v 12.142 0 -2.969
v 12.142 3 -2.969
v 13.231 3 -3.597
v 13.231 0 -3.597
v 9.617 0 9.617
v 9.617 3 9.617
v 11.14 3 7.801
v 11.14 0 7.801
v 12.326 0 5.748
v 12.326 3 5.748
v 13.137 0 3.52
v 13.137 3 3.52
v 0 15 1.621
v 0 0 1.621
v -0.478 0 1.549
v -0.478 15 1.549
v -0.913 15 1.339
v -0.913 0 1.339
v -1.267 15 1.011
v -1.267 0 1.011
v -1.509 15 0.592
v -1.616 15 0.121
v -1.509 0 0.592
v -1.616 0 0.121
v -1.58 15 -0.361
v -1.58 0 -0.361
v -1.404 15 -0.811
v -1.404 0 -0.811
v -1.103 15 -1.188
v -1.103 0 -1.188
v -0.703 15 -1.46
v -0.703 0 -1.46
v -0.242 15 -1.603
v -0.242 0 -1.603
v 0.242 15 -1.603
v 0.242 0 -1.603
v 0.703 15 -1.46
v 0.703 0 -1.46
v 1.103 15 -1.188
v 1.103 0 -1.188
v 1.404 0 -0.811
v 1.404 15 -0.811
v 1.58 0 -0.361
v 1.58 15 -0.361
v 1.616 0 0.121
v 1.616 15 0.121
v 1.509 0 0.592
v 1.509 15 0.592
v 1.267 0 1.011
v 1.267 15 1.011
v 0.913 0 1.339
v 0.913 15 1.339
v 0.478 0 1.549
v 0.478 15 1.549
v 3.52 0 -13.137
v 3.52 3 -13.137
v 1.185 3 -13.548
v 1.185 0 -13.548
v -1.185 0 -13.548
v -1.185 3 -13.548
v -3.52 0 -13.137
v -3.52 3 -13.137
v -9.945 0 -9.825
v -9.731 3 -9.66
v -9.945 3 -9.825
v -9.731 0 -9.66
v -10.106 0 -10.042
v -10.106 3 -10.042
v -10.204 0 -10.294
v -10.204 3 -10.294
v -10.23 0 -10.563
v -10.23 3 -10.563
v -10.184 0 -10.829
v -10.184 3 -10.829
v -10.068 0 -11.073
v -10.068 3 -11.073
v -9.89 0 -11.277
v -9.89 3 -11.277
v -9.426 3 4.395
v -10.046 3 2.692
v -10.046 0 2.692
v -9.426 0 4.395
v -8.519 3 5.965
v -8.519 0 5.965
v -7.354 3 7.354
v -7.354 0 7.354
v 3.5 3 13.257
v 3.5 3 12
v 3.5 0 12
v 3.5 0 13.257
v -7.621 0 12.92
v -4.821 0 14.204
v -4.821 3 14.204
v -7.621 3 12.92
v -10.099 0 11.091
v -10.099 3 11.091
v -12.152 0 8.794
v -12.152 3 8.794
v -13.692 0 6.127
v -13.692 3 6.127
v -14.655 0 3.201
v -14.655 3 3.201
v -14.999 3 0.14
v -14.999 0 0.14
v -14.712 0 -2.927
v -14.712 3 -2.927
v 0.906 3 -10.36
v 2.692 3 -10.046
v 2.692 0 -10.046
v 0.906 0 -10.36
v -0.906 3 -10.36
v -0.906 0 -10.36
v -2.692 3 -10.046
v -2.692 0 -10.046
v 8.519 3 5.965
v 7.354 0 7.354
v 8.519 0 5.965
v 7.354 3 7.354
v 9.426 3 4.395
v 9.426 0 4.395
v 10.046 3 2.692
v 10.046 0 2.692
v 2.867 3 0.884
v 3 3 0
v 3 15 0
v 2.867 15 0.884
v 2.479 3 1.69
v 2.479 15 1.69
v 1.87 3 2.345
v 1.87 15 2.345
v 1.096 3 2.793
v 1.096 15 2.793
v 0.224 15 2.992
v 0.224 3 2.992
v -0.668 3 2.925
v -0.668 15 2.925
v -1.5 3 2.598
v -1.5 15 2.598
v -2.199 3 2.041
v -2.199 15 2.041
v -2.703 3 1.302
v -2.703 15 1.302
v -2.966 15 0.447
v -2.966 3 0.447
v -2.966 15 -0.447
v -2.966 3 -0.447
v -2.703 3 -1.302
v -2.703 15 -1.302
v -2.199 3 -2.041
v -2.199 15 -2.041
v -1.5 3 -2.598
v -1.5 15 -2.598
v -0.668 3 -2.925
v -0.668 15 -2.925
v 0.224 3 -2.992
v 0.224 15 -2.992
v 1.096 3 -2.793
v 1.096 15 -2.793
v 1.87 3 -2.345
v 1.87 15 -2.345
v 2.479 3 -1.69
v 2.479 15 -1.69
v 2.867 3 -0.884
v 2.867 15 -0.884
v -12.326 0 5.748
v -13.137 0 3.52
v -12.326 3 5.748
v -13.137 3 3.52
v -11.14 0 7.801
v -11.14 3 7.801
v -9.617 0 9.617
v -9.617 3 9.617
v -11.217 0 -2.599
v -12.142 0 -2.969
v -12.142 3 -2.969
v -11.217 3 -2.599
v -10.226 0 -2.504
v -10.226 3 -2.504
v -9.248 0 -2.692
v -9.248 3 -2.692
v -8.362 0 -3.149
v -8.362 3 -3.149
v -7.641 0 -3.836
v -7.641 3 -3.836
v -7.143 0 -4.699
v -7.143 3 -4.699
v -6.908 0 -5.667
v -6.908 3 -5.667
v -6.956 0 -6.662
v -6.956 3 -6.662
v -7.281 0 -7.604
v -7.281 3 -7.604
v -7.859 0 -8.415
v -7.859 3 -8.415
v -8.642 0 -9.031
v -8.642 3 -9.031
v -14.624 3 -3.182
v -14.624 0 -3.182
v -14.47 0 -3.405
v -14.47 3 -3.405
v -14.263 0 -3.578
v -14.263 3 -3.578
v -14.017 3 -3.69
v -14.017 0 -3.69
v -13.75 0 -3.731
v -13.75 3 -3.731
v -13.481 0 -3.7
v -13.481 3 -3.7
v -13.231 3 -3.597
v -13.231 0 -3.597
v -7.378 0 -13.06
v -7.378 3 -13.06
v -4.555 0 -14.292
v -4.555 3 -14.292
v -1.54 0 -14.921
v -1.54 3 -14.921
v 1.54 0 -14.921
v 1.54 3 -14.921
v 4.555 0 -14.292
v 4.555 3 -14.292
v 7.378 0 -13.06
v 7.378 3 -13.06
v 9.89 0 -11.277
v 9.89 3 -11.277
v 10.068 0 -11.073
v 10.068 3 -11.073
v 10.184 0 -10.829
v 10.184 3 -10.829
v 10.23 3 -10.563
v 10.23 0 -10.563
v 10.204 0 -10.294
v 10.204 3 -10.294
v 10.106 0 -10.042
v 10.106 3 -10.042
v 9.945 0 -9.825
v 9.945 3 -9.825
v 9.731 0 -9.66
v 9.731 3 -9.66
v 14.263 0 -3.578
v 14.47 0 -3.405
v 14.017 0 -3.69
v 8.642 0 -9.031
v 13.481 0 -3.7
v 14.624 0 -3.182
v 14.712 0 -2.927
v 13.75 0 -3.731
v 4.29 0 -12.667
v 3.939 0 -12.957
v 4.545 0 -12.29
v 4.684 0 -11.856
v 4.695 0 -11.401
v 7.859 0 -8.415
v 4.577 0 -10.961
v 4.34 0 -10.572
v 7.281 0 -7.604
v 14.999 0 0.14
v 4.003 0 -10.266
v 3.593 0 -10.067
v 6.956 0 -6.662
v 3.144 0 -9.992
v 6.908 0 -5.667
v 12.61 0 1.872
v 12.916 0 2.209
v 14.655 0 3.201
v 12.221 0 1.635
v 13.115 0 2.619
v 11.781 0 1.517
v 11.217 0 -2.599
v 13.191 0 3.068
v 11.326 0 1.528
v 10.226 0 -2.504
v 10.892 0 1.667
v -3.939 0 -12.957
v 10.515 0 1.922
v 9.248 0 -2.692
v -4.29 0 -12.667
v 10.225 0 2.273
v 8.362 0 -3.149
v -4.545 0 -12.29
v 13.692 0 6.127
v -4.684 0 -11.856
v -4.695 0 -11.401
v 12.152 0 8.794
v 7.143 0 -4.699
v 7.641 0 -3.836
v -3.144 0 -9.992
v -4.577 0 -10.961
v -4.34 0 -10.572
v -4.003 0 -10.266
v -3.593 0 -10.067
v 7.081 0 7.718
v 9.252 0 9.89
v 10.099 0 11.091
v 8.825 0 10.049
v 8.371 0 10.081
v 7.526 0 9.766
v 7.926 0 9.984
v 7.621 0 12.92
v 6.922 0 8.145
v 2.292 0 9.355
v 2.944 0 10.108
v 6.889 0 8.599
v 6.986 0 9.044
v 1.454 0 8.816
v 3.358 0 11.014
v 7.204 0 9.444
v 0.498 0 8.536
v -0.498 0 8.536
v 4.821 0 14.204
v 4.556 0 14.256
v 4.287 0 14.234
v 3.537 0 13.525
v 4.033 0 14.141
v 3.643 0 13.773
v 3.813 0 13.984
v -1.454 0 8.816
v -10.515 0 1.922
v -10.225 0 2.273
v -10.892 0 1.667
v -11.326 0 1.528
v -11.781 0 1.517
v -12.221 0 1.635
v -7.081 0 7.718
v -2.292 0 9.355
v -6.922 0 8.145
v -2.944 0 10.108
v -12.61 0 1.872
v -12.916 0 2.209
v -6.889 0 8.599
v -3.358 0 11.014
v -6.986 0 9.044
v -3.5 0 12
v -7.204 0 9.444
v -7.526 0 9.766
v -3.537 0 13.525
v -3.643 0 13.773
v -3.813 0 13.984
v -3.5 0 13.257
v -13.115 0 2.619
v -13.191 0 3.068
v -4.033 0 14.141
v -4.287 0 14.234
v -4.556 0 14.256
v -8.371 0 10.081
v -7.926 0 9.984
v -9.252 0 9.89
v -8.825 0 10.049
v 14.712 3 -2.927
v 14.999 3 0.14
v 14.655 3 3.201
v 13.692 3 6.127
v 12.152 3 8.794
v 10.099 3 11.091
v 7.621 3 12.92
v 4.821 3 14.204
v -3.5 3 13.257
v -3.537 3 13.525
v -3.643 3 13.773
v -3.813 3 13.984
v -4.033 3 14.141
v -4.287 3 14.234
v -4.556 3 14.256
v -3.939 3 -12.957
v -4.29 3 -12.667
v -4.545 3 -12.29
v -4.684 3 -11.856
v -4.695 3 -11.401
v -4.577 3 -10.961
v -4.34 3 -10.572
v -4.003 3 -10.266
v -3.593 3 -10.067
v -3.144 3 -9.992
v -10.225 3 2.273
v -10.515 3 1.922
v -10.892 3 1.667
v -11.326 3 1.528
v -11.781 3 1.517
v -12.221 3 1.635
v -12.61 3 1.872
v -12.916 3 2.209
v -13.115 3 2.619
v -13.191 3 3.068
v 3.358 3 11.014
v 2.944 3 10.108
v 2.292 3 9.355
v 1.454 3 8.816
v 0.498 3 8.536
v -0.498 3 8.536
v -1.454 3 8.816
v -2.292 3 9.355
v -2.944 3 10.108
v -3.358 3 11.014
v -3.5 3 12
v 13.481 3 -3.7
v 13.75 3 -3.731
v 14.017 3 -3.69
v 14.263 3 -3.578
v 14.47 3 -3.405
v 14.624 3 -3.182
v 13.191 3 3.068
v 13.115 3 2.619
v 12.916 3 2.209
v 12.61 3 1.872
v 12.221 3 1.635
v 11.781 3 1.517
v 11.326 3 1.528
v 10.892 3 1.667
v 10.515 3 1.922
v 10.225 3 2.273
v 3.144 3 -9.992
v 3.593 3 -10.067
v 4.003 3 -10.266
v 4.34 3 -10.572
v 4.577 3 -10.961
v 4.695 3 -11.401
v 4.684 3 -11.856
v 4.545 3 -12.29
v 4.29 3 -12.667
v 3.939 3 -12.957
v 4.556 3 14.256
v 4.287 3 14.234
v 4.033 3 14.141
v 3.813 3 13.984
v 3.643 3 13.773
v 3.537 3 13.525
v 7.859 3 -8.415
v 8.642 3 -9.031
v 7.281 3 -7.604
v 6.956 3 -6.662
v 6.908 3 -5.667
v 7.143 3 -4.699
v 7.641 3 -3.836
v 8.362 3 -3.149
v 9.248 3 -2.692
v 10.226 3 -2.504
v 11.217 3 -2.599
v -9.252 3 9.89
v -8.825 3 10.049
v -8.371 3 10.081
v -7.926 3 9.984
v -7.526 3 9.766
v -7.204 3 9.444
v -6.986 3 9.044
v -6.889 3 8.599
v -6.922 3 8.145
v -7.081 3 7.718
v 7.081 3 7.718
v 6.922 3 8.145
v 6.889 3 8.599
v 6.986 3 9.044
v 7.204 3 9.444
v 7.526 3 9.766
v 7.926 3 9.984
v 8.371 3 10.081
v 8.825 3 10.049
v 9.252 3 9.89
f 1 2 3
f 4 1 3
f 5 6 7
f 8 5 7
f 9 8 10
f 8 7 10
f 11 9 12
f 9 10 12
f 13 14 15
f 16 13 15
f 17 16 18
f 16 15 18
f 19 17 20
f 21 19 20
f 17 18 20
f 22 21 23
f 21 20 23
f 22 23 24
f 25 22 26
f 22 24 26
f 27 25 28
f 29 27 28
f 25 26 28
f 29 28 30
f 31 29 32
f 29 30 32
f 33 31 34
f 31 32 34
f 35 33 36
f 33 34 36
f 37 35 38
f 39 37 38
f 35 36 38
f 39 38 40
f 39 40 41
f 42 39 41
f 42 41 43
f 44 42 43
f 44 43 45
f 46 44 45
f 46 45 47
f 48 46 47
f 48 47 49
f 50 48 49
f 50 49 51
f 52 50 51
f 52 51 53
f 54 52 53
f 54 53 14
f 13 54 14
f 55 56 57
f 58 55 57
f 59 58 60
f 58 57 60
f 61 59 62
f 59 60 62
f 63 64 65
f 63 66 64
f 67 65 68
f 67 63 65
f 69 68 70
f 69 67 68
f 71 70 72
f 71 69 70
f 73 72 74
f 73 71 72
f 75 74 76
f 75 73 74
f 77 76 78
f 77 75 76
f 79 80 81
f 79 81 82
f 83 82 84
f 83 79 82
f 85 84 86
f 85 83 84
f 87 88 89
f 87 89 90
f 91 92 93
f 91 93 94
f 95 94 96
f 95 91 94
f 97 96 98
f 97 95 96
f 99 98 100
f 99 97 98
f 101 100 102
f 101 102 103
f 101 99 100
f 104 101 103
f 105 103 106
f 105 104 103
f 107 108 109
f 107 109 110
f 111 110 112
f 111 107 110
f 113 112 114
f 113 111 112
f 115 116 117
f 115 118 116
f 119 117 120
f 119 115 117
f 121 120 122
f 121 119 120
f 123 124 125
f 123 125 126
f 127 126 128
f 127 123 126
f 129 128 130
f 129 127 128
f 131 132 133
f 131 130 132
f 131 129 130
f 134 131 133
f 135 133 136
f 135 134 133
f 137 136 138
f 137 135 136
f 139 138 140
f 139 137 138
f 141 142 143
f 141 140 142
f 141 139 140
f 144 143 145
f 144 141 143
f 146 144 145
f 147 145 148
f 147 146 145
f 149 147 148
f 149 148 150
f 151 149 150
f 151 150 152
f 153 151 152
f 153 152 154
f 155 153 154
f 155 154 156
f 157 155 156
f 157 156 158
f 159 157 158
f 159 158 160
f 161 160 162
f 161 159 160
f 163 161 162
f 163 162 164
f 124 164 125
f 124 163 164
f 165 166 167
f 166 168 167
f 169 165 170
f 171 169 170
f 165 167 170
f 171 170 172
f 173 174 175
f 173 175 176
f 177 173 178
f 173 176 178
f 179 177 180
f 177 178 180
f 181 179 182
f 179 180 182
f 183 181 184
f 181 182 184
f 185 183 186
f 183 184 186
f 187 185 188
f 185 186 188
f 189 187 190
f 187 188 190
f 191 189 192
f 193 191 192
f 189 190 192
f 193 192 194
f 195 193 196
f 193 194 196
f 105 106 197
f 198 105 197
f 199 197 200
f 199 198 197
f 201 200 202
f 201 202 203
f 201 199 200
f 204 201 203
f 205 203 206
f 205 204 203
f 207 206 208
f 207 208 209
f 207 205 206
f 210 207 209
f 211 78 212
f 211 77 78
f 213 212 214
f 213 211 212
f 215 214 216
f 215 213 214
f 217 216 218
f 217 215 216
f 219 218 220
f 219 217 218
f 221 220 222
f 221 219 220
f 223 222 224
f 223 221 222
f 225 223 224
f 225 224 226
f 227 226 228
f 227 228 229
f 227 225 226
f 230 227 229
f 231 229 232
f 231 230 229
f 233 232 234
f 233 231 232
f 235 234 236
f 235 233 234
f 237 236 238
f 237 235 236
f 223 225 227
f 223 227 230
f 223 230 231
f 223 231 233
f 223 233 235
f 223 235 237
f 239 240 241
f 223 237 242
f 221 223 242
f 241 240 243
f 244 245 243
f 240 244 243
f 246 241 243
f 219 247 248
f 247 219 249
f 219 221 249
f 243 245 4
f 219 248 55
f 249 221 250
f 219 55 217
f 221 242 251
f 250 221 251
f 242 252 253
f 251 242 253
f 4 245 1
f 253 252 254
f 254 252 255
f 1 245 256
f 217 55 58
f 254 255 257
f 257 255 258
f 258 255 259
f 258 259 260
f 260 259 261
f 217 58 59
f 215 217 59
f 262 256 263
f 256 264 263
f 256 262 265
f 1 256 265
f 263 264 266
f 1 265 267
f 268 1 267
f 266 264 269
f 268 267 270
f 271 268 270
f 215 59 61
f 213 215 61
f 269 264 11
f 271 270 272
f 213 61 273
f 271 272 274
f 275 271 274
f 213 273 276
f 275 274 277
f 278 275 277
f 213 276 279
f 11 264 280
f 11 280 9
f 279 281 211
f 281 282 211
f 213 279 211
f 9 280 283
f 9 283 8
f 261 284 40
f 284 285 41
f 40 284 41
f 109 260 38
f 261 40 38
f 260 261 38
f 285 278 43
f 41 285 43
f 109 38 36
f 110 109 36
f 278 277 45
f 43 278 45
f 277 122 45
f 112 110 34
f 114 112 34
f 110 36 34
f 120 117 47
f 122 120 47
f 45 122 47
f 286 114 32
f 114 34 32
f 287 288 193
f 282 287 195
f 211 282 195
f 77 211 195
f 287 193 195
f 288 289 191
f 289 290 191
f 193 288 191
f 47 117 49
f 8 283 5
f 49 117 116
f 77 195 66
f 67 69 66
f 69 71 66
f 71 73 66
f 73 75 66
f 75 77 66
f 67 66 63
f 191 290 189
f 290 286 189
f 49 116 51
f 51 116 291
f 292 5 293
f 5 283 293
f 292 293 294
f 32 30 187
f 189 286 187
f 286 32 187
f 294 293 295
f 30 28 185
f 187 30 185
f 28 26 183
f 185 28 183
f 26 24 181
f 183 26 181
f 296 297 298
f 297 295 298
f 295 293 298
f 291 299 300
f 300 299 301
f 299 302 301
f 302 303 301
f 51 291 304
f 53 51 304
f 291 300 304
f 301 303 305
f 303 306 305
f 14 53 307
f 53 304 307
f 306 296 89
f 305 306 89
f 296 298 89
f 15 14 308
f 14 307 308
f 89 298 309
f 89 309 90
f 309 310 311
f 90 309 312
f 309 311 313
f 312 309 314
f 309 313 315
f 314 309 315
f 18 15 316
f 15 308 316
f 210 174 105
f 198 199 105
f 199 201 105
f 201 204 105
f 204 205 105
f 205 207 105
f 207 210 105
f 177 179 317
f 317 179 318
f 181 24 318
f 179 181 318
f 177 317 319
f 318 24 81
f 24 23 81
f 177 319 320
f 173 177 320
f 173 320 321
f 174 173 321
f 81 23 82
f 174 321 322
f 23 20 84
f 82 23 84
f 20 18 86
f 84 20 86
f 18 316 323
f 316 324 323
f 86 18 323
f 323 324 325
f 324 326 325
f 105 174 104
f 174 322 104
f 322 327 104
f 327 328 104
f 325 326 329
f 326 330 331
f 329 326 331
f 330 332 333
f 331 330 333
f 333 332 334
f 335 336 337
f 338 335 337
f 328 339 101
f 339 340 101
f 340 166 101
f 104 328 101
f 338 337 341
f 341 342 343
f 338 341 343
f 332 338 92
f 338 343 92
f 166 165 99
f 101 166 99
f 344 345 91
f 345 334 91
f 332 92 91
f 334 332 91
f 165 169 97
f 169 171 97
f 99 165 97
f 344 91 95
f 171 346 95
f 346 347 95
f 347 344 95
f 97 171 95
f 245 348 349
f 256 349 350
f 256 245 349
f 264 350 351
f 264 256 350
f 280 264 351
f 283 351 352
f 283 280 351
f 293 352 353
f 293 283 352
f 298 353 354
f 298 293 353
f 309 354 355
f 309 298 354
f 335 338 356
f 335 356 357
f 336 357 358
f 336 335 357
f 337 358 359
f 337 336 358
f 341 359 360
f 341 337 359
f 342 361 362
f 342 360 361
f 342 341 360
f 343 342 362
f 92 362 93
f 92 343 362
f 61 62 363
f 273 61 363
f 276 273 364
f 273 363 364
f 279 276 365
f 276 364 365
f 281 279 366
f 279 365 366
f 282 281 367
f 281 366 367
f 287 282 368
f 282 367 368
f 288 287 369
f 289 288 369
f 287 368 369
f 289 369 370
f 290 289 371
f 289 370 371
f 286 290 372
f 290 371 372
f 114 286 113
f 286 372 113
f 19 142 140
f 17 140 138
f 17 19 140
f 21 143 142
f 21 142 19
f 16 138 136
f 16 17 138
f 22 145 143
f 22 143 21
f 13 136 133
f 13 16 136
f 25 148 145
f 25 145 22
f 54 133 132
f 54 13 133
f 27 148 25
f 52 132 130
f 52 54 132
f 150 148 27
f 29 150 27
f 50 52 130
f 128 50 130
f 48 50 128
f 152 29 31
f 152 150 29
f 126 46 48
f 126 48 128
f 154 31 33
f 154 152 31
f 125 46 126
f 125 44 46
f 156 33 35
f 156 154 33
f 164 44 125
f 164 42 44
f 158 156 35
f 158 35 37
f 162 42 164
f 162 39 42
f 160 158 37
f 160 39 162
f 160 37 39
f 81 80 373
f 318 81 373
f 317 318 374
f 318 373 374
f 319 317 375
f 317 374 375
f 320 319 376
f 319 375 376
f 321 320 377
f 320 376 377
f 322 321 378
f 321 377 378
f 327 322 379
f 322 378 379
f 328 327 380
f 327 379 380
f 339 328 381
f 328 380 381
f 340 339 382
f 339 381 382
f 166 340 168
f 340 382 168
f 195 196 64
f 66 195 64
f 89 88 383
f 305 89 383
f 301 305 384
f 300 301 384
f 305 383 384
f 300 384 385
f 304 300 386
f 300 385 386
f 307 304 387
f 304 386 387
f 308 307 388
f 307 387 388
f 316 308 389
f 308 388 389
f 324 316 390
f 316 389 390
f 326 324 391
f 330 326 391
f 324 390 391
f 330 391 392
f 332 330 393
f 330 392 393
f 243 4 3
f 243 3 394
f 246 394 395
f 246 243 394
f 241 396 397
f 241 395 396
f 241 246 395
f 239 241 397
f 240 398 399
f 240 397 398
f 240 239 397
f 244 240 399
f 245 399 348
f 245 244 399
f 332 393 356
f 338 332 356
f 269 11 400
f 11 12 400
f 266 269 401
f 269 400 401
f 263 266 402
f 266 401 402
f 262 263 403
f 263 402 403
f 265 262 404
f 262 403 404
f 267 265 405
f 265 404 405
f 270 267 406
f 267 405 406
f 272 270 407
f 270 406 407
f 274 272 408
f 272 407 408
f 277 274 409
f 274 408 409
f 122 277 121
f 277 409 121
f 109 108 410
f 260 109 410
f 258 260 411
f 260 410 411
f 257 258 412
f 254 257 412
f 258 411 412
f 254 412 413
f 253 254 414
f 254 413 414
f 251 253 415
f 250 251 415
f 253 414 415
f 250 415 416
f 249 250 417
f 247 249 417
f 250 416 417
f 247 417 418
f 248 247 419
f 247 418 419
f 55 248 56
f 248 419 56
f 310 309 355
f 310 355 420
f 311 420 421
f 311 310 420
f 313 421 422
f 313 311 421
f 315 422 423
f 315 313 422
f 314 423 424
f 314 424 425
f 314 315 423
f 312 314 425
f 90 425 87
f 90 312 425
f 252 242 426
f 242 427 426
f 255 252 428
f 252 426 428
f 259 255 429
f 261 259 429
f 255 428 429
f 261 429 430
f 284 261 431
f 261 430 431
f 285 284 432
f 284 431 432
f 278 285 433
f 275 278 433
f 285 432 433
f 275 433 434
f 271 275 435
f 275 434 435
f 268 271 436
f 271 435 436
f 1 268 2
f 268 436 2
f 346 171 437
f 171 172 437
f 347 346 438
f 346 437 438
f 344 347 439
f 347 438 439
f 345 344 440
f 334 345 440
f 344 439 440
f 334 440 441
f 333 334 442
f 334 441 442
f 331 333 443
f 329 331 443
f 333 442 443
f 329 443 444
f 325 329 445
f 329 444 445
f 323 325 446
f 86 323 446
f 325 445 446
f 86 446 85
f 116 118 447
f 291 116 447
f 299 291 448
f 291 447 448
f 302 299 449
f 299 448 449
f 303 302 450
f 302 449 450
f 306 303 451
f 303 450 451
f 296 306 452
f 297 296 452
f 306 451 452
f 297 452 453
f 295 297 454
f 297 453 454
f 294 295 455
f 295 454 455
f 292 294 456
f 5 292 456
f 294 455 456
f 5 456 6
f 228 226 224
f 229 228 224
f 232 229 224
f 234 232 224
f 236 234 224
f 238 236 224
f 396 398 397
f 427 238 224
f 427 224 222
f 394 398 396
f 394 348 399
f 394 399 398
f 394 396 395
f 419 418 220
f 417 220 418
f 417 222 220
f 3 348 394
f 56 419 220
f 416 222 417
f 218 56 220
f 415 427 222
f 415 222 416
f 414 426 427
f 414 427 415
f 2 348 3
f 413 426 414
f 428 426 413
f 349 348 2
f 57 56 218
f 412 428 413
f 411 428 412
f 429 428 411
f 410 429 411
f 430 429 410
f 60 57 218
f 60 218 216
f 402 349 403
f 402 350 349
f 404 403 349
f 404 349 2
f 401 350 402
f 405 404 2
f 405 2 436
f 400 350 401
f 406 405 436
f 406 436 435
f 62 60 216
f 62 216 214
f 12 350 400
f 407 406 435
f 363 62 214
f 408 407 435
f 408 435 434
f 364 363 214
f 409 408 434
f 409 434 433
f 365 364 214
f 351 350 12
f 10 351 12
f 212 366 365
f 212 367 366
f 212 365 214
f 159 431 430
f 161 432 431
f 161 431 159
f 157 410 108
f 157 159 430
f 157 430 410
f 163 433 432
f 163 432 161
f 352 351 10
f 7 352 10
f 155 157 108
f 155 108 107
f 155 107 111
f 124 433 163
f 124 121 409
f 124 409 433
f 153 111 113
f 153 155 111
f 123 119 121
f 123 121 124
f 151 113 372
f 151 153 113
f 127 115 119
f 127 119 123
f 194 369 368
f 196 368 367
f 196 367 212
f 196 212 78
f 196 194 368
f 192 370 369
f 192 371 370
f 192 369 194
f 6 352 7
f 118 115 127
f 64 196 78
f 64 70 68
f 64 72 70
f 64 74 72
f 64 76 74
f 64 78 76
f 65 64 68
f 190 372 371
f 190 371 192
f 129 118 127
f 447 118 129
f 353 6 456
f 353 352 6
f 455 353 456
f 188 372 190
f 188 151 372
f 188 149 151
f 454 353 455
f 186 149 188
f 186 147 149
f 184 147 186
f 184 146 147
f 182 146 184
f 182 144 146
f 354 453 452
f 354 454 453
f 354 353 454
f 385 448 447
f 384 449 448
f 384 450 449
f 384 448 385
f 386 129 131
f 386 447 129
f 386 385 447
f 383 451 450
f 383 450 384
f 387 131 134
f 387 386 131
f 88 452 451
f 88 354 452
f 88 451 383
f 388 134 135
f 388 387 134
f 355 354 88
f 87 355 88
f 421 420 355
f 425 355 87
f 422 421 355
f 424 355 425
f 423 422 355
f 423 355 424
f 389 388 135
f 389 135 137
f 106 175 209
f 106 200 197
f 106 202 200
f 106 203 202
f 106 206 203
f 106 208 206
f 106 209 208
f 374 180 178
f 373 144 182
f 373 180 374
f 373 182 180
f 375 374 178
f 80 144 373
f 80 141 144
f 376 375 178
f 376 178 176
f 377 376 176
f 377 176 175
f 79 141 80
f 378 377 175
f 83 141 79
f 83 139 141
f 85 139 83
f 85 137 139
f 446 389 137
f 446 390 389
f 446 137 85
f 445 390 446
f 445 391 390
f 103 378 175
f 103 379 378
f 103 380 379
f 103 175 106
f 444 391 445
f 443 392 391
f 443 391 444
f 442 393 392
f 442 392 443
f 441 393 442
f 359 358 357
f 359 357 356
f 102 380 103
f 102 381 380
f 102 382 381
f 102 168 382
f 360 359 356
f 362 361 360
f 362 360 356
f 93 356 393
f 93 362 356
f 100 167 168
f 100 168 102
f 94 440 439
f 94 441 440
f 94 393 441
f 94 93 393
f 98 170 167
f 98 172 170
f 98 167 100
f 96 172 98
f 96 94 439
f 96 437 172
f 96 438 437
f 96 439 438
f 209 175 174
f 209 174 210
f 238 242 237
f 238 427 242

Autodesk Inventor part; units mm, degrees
ref_plane "YZ Plane" through (0, 0, 0) normal (1, 0, 0) x (0, 1, 0)
ref_plane "XZ Plane" through (0, 0, 0) normal (0, 1, 0) x (-1, 0, 0)
ref_plane "XY Plane" through (0, 0, 0) normal (0, 0, 1) x (1, 0, 0)
sketch "Sketch1" plane through (0, 0, 0) normal (0, 1, 0) x (-1, 0, 0)
  circle A0 centre (0, 0) radius 15
  dimension "d0" = 30
extrude "Extrusion1" add sketch "Sketch1" along normal blind 3
sketch "Sketch6" plane through (0, 3, 0) normal (0, 1, 0) x (1, 0, 0)
  circle A0 centre (0, 0) radius 3
  dimension "d24" = 6
extrude "Extrusion4" add sketch "Sketch6" along normal blind 12
sketch "Sketch8" plane through (0, 15, 0) normal (0, 1, 0) x (1, 0, 0)
  point P0 (0, 0)
  point P1 (0, 0)
hole "Hole2" at (0, 15, 0) direction (0, -1, 0) diameter 3.242 end through all thread size "M4x0.7" class "6H" standard "ANSI Metric M Profile"
sketch "Sketch9" plane through (0, 3, 0) normal (0, 1, 0) x (1, 0, 0)
  arc A0 (3.1058, 11.5911) -> (-3.1058, 11.5911) centre (0, 0) ccw construction
  arc A1 (3.5199, 13.1366) -> (-3.5199, 13.1366) centre (0, 0) ccw
  arc A2 (2.6917, 10.0456) -> (-2.6917, 10.0456) centre (0, 0) ccw
  arc A3 (2.6917, 10.0456) -> (3.5199, 13.1366) centre (3.1058, 11.5911) ccw
  arc A4 (-3.5199, 13.1366) -> (-2.6917, 10.0456) centre (-3.1058, 11.5911) ccw
  circle A5 centre (0, 0) radius 15 projected
  point P0 (0, 15)
  dimension "d37" = 3.2
  dimension "d38" = 30
  dimension "d39" = 15
  dimension "d45" = 12
extrude "Extrusion6" cut sketch "Sketch9" against normal through all contours A3 A2 A4 A1
pattern_circular "Circular Pattern2" count 3 over 360 about axis through (0, 3, 0) along (0, 1, 0) of "Extrusion6"
sketch "Sketch11" plane through (0, 3, 0) normal (0, 1, 0) x (1, 0, 0)
  circle A0 centre (0, -12) radius 3.5
  line L0 (3.5, -12) -> (3.5, -14.586)
  line L1 (-3.5, -12) -> (-3.5, -14.586)
  arc A1 (-3.5, -14.586) -> (3.5, -14.586) centre (0, 0) ccw
  circle A2 centre (0, 0) radius 15 projected
  point P0 (-2.011, -14.8646)
  point P1 (2.011, -14.8646)
  dimension "d48" = 7
  dimension "d49" = 12
extrude "Extrusion7" cut sketch "Sketch11" against normal through all contours A0 A1 | L0 A1 A0 | A0 A1 L1 | A0 A1
fillet "Fillet1" radius 1 2 edges at (-3.5, 1.5, 14.586) (3.5, 1.5, 14.586)
pattern_circular "Circular Pattern3" count 3 over 360 about axis through (0, 0, 0) along (0, 1, 0) of "Extrusion7", "Fillet1"
properties part number "FrameSupport-Flange" material "Copper"
